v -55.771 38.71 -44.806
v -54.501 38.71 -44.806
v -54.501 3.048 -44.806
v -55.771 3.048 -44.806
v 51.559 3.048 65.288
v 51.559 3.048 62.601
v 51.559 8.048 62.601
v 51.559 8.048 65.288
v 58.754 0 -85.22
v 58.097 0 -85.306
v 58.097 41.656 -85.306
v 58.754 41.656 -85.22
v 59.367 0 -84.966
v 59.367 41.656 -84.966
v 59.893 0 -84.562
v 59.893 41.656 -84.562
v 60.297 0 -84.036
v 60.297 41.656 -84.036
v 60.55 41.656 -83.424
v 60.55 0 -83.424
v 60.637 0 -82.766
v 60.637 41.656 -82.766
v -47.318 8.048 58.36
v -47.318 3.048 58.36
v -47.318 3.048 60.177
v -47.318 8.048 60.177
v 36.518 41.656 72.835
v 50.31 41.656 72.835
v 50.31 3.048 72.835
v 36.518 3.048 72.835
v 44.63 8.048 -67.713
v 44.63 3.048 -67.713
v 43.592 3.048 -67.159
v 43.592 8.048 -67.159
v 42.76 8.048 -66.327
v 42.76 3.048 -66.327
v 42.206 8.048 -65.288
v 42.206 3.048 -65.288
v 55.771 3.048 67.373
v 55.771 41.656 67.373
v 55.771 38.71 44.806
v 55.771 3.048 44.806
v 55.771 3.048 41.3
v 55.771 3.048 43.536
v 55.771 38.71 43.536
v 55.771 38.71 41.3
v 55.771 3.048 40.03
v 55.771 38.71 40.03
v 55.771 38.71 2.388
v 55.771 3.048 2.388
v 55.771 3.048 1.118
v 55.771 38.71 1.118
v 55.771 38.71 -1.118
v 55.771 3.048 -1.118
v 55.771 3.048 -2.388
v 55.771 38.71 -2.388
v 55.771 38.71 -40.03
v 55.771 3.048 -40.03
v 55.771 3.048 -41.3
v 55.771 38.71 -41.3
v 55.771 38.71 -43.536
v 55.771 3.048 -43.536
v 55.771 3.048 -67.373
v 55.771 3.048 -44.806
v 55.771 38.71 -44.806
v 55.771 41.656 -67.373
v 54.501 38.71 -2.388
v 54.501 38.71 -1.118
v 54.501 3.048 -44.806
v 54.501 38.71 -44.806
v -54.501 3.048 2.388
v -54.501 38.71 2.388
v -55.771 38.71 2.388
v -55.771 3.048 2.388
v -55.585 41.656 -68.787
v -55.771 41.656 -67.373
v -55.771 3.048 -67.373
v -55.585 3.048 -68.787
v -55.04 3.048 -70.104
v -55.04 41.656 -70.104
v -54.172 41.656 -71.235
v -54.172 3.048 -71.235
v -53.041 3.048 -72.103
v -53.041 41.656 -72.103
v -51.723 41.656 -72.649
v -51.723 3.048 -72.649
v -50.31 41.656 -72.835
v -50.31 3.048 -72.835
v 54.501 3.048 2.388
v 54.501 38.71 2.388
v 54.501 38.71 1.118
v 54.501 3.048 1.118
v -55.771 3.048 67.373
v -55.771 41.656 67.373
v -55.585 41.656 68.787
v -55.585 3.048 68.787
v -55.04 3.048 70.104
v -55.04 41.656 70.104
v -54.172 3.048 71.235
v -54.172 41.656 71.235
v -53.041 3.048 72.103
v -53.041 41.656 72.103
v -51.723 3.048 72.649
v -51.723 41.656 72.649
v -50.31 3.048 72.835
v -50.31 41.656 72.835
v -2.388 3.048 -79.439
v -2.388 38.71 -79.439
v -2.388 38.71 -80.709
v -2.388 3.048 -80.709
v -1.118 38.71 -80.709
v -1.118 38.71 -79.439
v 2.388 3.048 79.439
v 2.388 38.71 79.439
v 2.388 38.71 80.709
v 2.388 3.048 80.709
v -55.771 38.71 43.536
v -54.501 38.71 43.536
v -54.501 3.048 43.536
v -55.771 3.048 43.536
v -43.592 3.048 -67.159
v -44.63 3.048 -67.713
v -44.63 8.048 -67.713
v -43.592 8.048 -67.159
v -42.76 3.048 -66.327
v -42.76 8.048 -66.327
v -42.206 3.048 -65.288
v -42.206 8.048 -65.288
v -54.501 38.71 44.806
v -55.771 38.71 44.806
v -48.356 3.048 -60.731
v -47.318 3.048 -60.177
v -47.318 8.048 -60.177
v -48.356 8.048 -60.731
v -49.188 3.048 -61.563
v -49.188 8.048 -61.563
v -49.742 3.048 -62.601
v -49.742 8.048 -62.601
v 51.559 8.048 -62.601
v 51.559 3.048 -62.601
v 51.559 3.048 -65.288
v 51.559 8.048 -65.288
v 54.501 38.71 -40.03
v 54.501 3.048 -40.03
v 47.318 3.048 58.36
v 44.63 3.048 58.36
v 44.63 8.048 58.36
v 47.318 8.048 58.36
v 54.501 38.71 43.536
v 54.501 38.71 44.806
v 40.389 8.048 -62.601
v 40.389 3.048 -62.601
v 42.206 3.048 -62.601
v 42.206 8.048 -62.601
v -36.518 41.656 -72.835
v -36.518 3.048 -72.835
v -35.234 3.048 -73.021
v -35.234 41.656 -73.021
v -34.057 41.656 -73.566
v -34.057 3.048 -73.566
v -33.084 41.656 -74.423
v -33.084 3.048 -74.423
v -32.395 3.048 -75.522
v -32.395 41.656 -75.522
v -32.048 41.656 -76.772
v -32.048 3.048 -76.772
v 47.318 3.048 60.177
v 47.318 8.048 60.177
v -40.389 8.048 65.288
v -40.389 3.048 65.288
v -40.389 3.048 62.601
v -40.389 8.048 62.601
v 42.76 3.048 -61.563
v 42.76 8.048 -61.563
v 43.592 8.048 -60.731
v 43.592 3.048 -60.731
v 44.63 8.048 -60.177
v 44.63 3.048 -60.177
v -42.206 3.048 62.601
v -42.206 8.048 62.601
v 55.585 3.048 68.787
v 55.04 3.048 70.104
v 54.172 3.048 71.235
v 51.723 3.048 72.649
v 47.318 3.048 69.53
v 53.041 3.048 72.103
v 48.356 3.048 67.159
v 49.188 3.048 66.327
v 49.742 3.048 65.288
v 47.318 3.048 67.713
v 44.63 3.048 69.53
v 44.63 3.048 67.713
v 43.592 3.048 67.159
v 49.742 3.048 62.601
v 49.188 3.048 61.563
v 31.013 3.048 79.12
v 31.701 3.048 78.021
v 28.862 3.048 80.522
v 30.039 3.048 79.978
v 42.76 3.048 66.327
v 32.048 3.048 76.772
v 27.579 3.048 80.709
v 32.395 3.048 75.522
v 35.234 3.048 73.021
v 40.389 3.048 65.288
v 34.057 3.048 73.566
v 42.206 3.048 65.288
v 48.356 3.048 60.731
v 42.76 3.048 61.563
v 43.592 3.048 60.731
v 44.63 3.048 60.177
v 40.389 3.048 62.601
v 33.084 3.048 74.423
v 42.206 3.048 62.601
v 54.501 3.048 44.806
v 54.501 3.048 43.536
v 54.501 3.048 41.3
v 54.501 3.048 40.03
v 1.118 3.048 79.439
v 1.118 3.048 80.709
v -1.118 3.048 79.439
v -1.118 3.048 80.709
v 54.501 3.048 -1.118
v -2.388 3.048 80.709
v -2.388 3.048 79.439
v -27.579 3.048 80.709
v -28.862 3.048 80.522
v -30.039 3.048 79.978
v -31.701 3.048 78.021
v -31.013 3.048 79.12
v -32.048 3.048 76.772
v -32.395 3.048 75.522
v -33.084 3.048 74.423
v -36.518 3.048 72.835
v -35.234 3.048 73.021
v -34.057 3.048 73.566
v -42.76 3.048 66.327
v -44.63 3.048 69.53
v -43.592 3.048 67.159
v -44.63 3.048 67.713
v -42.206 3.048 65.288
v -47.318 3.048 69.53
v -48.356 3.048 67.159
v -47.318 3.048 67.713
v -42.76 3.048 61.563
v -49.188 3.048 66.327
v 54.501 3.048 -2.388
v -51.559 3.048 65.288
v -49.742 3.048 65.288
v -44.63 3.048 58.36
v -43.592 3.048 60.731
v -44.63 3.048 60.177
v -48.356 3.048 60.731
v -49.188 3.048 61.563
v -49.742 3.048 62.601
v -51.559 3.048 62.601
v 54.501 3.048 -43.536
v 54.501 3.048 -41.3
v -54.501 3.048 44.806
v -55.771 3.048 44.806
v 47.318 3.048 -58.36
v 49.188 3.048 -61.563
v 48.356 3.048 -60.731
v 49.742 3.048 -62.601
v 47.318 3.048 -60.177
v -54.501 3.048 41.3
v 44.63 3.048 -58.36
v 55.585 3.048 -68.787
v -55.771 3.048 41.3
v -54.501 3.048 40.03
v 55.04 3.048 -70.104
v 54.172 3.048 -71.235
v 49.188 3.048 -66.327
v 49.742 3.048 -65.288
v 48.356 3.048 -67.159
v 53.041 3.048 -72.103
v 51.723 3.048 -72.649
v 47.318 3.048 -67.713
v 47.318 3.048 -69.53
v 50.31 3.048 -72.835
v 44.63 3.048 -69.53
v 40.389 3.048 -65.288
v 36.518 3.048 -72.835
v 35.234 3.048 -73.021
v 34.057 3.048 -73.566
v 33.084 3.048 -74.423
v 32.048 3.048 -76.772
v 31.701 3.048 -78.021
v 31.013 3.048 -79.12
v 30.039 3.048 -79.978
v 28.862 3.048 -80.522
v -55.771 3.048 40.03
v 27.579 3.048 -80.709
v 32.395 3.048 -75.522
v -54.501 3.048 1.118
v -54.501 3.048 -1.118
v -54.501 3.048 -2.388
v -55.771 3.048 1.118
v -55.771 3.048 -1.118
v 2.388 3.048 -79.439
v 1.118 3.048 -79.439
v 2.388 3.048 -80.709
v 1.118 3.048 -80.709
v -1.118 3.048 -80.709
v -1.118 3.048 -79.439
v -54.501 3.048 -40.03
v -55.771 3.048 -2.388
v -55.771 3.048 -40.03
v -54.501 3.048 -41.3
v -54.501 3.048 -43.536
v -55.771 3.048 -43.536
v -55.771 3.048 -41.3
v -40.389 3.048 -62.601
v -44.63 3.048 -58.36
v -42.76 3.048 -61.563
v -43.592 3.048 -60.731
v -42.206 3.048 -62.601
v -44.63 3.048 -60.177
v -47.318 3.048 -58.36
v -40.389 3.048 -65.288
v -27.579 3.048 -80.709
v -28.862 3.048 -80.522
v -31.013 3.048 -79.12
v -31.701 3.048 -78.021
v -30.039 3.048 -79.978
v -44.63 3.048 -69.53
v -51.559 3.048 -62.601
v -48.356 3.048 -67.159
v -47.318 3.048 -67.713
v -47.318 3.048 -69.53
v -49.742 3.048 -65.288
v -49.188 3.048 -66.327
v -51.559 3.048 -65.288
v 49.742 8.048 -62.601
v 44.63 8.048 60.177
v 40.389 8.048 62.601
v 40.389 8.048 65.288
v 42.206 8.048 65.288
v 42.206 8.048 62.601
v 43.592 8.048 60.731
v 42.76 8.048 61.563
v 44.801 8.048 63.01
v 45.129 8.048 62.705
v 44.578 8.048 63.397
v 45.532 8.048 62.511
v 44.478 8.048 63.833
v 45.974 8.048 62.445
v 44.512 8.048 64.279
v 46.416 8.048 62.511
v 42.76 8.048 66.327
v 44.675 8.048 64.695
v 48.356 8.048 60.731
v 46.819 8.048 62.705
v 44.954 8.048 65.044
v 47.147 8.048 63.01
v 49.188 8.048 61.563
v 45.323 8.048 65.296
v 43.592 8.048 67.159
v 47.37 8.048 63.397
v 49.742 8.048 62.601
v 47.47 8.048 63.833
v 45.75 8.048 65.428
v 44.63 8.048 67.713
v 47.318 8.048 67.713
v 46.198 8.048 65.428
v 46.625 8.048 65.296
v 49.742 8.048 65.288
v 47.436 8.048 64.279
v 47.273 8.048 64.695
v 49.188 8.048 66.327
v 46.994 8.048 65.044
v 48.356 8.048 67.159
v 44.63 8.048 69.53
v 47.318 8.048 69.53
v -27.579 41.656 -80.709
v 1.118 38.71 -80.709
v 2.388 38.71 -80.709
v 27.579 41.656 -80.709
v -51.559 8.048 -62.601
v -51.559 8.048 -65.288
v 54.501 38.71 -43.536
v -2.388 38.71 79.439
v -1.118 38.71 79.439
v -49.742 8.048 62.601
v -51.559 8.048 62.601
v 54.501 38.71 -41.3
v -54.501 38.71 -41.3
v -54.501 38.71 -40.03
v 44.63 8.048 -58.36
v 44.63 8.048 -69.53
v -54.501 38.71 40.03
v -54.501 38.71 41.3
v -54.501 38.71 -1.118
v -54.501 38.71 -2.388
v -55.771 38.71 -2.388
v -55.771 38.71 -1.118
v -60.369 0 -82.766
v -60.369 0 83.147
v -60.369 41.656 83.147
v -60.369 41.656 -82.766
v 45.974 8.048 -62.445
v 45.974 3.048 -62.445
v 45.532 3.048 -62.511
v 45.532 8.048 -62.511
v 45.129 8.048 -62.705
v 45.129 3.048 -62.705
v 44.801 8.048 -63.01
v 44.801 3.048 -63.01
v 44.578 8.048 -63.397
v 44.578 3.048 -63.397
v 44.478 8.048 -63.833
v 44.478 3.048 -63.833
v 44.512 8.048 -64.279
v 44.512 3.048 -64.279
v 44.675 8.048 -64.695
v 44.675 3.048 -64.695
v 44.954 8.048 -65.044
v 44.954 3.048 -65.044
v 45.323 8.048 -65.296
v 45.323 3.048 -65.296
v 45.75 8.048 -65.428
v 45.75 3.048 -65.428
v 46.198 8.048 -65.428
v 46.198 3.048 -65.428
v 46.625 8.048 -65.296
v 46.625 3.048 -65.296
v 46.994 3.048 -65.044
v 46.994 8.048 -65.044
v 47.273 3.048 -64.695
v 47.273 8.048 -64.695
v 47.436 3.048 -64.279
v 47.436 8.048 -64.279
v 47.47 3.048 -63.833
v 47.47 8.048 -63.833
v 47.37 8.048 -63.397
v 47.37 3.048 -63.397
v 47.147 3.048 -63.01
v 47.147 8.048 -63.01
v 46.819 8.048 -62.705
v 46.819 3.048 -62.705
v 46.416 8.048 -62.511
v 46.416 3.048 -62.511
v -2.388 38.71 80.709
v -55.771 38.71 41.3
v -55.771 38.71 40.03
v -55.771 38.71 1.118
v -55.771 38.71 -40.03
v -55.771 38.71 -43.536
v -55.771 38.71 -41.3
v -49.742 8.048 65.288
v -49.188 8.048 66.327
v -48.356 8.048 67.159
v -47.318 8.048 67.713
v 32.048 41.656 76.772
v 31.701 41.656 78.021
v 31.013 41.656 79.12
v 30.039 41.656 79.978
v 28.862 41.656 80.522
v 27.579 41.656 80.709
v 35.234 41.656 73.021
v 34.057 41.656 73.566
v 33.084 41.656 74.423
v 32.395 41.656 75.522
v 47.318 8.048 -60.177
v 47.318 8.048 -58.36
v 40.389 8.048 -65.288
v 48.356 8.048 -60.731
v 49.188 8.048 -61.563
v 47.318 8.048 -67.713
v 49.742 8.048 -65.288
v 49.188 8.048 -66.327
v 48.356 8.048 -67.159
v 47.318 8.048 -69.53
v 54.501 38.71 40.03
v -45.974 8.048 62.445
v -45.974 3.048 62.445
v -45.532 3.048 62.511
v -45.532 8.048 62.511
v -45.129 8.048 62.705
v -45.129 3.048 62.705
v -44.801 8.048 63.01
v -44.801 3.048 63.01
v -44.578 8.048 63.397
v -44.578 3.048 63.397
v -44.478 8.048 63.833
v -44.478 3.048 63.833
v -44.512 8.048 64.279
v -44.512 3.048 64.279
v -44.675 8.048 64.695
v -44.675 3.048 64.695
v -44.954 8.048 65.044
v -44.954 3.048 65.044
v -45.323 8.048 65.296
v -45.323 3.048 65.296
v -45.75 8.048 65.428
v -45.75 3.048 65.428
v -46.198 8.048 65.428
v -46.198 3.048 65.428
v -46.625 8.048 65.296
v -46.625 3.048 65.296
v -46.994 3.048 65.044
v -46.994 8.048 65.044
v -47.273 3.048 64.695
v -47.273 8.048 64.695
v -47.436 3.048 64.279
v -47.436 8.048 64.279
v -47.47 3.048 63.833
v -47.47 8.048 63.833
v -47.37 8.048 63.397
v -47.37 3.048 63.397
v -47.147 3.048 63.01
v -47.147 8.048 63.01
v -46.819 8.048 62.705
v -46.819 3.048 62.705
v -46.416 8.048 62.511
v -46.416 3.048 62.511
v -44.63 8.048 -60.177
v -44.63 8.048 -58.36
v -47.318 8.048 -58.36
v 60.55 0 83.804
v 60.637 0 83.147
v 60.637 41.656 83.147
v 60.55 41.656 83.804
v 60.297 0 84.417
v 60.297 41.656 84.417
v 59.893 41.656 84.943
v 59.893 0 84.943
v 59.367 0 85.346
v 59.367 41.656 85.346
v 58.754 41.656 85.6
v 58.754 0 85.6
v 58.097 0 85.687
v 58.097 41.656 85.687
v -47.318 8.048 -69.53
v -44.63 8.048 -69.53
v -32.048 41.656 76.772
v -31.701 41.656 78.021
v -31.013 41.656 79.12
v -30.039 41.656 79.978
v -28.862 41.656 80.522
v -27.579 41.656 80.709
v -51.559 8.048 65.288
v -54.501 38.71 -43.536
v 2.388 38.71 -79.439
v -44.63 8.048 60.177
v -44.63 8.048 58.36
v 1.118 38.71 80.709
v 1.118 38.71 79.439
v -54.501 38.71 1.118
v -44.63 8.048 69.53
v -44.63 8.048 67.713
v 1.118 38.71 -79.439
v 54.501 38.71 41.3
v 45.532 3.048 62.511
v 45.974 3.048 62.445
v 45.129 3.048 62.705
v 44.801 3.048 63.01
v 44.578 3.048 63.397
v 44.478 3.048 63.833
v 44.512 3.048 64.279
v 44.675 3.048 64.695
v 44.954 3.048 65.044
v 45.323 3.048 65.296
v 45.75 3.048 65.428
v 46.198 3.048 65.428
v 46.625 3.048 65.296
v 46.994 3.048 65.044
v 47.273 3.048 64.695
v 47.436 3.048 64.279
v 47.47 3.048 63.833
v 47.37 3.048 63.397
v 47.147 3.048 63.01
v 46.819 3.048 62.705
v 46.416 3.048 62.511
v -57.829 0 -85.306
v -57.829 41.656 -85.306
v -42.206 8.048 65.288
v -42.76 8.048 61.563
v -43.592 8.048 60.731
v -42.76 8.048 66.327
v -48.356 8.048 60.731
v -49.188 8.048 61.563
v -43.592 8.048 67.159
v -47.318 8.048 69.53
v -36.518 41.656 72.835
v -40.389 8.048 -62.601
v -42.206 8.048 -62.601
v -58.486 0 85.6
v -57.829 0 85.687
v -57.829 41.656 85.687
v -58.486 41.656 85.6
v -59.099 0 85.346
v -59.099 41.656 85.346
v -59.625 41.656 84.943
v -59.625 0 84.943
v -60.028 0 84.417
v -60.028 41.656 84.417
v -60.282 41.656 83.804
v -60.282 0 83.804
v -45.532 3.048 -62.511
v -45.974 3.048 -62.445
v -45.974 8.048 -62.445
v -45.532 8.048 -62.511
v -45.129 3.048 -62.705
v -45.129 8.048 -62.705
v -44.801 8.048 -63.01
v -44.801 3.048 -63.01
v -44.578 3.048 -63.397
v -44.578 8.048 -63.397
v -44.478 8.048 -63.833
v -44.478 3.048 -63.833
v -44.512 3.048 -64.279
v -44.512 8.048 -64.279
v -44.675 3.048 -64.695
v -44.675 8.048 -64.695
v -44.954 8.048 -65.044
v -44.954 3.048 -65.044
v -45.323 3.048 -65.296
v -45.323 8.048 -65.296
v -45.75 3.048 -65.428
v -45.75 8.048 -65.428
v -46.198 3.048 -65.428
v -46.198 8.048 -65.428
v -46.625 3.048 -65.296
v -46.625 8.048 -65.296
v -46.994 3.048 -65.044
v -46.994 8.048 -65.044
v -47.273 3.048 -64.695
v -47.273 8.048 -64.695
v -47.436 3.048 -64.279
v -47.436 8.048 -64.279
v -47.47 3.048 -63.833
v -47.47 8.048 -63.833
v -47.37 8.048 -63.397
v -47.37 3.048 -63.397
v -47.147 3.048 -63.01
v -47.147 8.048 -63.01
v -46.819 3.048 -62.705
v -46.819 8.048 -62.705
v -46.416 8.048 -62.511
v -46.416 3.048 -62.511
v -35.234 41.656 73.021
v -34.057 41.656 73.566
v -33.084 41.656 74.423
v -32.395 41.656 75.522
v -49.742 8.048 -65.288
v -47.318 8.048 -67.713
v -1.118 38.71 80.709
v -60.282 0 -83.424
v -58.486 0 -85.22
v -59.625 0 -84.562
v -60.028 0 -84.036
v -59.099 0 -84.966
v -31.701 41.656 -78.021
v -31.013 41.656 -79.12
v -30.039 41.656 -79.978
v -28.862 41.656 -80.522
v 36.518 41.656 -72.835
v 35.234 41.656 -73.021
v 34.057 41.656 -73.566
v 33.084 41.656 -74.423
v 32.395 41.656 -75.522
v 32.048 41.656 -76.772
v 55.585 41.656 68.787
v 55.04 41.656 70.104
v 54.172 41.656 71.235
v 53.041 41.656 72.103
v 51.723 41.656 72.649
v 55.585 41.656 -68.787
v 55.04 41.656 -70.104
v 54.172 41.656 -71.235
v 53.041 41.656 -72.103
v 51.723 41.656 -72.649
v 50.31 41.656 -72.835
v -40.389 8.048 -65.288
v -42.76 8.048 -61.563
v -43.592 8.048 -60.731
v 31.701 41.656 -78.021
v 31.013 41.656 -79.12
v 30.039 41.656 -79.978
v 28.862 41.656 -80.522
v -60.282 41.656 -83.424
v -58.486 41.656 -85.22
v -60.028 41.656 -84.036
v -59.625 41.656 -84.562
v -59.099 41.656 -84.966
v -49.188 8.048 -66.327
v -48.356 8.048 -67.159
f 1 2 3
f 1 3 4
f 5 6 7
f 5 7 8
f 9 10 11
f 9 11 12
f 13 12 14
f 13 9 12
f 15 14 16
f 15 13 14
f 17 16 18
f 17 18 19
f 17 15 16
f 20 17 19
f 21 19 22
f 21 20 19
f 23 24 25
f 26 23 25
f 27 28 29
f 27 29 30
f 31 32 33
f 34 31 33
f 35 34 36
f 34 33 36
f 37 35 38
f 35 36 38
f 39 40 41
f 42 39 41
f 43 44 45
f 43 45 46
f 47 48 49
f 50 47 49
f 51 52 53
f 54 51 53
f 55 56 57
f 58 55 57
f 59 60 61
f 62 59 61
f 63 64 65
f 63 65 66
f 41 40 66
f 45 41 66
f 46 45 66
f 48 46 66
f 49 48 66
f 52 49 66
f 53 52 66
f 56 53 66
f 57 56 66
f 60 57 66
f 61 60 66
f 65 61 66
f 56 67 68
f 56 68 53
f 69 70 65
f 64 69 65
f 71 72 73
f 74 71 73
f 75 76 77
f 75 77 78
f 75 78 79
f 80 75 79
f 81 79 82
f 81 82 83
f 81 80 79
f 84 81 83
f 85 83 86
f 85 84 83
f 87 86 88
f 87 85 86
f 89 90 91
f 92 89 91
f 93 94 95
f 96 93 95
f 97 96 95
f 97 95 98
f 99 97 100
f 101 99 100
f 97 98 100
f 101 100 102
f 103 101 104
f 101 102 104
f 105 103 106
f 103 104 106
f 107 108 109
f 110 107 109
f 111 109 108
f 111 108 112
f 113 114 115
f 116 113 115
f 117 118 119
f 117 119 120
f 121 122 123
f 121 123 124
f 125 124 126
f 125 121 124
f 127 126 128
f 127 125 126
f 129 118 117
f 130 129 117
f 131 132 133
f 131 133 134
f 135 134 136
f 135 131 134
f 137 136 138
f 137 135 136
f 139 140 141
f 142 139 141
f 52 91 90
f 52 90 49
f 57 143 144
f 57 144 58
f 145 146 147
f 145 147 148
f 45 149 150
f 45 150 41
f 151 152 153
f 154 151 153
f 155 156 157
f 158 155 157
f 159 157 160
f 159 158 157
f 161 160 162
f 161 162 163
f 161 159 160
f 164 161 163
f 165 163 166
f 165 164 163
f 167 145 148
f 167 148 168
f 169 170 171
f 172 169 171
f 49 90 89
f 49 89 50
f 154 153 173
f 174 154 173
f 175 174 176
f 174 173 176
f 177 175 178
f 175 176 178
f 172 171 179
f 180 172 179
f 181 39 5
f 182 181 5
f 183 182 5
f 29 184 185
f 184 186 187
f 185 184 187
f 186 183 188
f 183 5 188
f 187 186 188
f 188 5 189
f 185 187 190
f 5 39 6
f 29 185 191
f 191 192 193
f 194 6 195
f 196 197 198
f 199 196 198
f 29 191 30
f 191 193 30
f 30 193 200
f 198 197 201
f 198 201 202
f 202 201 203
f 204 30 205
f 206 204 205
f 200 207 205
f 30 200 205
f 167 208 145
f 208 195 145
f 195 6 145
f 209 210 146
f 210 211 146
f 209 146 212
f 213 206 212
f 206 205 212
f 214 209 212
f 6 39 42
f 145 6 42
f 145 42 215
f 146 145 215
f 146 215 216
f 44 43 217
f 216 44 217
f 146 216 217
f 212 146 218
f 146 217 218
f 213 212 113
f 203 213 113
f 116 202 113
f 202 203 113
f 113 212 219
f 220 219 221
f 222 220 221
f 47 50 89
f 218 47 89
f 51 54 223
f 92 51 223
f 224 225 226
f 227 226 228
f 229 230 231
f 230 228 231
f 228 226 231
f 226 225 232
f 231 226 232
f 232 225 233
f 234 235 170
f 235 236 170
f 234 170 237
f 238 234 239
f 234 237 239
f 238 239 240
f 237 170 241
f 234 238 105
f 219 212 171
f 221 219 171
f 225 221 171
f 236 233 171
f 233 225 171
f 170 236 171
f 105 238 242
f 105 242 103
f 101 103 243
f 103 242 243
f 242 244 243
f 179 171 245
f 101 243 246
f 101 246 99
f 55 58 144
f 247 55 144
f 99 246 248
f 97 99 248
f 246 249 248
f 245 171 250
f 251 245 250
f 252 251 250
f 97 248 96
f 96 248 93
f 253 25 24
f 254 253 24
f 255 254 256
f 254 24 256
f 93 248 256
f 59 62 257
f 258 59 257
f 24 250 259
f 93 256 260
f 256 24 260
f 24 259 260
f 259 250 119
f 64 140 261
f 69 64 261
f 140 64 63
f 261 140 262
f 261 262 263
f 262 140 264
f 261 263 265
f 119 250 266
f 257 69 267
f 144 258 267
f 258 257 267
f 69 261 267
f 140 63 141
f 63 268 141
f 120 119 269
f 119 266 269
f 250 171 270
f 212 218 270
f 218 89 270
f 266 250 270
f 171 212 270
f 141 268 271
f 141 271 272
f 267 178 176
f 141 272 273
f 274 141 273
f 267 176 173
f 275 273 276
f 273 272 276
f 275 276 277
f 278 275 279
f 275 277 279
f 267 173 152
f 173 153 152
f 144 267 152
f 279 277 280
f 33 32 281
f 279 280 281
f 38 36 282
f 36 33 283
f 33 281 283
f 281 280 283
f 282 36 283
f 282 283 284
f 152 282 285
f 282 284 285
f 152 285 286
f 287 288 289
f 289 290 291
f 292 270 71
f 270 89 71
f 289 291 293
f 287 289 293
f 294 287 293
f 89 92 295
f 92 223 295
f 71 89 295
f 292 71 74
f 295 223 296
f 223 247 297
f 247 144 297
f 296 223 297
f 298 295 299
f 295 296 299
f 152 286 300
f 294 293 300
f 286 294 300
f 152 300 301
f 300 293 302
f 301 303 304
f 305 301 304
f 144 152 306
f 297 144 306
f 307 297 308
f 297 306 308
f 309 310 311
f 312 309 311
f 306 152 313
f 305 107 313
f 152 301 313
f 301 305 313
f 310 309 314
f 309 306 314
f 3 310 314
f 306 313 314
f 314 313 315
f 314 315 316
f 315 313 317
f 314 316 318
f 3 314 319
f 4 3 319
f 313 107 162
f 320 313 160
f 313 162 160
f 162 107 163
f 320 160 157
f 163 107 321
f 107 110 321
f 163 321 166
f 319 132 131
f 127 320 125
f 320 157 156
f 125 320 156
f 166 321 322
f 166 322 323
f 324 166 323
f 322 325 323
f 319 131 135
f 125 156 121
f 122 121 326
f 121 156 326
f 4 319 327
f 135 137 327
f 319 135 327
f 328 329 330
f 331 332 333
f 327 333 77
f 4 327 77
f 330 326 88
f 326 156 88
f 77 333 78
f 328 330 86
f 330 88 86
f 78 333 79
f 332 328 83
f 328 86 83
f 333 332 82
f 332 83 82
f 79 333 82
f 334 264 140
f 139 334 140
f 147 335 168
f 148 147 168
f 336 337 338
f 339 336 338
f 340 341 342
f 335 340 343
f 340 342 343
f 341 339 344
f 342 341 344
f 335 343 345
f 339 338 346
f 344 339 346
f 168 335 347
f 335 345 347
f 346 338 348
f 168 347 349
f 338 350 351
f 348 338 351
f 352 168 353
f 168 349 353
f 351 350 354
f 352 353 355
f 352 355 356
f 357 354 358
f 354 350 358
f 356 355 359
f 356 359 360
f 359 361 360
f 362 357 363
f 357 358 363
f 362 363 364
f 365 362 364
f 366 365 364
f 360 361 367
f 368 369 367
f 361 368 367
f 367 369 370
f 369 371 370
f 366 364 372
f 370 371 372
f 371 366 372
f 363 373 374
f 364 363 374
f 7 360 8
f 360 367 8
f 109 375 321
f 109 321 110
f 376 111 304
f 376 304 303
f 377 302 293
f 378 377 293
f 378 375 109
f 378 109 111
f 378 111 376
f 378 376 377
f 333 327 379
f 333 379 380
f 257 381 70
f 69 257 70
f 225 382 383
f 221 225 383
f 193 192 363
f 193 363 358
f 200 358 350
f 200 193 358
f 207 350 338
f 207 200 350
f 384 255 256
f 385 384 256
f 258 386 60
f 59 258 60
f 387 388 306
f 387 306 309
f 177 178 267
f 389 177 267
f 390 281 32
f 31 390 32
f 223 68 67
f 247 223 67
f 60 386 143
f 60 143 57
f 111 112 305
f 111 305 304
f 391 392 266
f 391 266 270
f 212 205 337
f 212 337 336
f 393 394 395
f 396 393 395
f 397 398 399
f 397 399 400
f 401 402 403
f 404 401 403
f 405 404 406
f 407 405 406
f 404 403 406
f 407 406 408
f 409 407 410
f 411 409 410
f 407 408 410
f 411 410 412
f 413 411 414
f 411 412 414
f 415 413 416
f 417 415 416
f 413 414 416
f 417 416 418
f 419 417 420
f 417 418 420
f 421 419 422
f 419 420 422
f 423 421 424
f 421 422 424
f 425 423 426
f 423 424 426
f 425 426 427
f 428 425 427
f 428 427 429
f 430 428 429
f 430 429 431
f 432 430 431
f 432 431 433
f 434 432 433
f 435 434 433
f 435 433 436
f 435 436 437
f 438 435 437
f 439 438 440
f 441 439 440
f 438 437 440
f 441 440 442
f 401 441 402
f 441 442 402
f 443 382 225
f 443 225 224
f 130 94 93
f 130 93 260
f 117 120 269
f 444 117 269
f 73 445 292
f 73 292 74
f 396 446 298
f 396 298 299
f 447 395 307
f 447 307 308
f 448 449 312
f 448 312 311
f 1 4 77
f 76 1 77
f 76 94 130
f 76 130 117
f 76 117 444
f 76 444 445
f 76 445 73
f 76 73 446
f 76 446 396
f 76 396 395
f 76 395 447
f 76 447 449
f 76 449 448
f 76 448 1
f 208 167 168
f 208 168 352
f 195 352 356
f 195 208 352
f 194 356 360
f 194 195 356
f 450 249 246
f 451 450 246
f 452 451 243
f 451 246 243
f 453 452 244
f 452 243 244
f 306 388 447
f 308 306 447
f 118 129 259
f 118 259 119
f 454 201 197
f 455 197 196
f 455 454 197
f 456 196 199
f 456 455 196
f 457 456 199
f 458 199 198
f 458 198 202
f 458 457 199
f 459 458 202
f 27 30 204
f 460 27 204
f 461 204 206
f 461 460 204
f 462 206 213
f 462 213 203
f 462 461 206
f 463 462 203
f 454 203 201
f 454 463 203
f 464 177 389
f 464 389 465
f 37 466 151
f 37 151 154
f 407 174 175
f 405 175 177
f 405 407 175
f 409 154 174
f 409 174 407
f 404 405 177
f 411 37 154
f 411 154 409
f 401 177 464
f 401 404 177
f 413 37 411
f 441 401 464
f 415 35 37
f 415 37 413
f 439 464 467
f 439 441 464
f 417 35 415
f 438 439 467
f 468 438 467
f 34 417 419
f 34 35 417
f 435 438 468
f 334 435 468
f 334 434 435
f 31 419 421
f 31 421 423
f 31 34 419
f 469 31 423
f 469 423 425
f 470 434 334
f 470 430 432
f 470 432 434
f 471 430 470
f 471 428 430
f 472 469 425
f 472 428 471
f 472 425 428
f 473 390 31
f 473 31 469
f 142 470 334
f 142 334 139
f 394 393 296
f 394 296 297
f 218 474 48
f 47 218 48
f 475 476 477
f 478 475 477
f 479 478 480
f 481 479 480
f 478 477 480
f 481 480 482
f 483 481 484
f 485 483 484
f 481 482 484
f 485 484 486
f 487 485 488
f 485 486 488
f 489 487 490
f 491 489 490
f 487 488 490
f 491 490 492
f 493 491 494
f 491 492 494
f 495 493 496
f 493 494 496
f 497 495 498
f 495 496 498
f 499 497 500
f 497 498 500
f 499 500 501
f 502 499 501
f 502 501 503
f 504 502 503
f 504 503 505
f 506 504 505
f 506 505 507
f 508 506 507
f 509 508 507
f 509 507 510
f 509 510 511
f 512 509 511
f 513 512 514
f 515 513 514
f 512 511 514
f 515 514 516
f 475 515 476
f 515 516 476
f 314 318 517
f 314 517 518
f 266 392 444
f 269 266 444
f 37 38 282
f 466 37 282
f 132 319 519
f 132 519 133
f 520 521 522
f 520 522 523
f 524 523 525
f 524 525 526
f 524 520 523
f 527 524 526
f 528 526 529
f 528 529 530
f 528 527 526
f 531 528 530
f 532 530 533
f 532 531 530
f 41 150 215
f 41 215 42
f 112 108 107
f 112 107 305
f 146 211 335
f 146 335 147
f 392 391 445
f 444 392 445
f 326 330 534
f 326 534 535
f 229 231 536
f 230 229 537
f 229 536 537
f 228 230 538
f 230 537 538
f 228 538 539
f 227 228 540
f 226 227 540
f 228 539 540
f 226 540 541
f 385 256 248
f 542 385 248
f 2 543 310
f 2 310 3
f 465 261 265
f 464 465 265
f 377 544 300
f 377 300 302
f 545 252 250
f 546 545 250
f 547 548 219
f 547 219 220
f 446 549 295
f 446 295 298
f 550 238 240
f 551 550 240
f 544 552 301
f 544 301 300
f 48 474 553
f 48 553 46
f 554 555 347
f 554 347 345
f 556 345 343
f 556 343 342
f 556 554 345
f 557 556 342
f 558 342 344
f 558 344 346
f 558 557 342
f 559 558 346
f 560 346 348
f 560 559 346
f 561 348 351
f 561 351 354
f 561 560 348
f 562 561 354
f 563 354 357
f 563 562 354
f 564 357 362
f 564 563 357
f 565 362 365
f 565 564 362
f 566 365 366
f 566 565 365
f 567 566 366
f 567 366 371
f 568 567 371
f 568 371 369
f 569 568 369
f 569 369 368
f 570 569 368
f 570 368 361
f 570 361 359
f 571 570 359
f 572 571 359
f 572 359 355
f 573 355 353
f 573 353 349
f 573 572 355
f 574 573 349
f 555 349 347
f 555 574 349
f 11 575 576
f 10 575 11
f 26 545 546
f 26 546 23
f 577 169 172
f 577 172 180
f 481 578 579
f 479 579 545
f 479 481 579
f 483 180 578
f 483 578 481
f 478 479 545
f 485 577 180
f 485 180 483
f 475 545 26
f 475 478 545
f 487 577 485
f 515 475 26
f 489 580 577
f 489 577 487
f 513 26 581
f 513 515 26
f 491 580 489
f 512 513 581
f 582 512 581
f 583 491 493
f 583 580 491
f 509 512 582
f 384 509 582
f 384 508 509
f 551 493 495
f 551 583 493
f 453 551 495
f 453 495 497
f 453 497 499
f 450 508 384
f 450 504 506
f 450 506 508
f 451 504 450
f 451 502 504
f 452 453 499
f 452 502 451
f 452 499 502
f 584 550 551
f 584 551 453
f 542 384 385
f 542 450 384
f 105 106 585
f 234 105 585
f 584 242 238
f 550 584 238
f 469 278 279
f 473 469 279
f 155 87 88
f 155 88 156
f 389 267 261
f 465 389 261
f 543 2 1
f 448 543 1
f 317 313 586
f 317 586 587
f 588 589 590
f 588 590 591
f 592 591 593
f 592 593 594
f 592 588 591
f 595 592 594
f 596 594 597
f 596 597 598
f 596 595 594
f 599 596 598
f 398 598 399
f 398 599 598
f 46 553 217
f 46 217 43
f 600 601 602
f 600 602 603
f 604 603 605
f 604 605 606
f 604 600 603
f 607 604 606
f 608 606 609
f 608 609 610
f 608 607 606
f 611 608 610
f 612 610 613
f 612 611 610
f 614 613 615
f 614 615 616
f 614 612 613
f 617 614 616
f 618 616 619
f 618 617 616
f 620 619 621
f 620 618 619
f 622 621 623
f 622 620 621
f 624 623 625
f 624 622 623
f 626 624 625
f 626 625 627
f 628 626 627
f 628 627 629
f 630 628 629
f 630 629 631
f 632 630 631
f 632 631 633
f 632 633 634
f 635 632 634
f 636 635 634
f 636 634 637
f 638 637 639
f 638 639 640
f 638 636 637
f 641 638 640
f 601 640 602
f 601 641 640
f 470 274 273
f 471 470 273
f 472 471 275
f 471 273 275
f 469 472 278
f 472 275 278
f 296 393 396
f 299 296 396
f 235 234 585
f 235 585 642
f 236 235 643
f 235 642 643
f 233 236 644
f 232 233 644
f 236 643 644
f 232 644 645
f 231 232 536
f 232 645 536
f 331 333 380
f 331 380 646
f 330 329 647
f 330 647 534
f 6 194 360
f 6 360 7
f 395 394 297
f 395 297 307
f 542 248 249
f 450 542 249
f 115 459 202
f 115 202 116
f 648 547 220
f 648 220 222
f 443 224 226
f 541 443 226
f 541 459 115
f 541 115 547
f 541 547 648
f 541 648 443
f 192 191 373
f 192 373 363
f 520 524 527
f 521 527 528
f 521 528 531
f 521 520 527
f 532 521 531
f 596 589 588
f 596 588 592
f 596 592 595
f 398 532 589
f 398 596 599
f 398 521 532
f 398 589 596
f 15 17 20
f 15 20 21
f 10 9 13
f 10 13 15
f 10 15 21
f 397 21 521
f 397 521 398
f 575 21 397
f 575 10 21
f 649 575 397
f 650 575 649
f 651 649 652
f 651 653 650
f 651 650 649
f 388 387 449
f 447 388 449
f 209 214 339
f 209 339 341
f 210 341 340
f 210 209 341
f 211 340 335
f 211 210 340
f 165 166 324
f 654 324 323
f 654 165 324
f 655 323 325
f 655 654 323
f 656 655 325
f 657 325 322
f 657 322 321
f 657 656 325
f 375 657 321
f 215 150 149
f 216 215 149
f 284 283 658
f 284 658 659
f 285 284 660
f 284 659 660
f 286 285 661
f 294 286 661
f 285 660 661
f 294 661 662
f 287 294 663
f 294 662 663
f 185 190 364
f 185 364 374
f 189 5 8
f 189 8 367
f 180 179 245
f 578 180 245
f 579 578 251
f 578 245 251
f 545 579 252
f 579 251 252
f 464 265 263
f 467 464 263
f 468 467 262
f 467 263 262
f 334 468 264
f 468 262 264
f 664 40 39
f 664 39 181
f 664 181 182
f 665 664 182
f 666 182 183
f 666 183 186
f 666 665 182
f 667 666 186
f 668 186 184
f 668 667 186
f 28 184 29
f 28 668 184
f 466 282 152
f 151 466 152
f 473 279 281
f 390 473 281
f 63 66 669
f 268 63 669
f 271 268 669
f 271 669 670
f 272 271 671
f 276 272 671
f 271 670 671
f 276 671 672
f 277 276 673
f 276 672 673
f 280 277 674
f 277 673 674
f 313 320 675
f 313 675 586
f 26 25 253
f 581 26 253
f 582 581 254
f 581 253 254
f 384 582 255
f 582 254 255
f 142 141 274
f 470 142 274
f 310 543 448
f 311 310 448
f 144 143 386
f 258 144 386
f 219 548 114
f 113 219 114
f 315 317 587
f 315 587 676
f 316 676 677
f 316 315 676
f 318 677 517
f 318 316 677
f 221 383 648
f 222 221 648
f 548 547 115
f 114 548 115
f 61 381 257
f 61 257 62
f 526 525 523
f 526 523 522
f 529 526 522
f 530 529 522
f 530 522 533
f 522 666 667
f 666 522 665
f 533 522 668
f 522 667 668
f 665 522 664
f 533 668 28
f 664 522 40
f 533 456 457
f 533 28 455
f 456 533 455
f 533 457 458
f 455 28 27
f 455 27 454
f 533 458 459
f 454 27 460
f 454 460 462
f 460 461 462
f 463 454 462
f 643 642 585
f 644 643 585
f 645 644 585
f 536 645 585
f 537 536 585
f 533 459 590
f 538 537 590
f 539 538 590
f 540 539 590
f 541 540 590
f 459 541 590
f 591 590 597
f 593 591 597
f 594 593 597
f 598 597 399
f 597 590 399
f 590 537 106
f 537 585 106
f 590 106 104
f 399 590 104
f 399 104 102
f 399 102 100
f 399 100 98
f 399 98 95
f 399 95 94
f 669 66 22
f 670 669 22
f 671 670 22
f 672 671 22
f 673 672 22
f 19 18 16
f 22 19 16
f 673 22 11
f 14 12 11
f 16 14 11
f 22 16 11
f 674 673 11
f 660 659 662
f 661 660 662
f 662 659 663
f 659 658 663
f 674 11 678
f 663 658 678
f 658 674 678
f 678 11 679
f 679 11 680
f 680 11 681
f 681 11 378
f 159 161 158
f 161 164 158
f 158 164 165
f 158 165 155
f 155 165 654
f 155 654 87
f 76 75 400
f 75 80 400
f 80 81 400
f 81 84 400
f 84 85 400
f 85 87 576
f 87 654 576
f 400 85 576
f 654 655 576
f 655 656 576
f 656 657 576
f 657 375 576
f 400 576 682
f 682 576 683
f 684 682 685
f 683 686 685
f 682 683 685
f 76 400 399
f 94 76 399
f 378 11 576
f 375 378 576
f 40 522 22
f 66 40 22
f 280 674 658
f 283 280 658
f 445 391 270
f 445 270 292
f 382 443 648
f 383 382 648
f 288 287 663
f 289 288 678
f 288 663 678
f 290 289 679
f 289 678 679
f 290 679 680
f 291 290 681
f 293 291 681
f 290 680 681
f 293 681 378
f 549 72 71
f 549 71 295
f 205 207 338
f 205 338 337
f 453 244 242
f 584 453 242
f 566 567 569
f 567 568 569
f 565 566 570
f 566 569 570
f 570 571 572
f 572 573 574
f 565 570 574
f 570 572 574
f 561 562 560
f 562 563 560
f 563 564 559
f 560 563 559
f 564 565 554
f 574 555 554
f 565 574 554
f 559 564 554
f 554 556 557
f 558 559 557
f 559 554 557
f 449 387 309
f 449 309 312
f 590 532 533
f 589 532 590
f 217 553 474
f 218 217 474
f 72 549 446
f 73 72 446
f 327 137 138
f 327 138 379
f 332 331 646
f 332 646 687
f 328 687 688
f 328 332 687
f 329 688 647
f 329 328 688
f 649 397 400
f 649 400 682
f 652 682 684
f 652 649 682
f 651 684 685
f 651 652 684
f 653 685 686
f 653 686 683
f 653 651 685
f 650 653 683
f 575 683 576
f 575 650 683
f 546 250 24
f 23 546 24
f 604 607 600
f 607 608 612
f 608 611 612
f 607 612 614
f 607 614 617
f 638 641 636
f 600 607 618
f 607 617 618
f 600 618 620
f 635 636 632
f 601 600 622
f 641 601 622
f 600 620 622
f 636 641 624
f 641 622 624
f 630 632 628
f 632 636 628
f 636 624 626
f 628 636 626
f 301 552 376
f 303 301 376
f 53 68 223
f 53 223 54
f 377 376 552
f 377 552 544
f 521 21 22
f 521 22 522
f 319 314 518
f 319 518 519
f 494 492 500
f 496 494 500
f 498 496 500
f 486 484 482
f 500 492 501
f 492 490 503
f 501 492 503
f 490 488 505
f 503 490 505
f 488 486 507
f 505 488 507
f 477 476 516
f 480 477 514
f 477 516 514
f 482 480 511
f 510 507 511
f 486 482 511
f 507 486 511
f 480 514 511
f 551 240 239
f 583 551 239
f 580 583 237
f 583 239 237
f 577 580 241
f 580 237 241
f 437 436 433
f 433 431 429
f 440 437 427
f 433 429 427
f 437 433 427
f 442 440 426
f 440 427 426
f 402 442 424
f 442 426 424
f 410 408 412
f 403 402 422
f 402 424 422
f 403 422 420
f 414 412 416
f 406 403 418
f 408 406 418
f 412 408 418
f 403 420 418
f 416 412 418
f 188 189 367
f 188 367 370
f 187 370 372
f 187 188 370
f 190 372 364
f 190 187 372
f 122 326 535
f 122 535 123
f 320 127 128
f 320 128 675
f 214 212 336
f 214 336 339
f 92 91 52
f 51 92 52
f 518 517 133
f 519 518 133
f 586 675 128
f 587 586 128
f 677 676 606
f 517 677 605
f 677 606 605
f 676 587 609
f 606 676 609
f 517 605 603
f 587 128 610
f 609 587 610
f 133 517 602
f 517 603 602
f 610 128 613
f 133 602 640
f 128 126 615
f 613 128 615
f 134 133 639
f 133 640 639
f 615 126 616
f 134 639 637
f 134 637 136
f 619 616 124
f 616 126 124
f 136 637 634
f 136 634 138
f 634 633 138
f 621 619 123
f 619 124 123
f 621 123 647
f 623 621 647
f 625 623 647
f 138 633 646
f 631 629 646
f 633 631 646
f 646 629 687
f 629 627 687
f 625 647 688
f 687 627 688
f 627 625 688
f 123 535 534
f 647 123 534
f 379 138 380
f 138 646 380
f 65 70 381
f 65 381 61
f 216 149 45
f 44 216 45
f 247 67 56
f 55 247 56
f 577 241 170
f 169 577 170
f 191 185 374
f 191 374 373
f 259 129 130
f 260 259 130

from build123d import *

# Parameters (mm, degrees)
BOSS_EXTRUDE1_DEPTH     = 41.656
CUT_EXTRUDE1_DEPTH      = 38.608
SKETCH7_R               = 1.5
BOSS_EXTRUDE2_DEPTH     = 5
MIRROR2_COPY_1_DEPTH    = 38.608
MIRROR2_COPY_2_SKETCH_R = 1.5
MIRROR2_COPY_2_DEPTH    = 5
BOSS_EXTRUDE3_START     = -2.9464
SKETCH9_W               = 1.27
SKETCH9_H               = 1.27
BOSS_EXTRUDE3_DEPTH     = 35.6616
BOSS_EXTRUDE4_START     = -2.9464
SKETCH10_W              = 1.27
SKETCH10_H              = 1.27
BOSS_EXTRUDE4_DEPTH     = 35.6616


with BuildPart() as part:
    # Sketch3 → Boss-Extrude1 (new body)
    with BuildSketch(Plane(origin=(0, 0, 0), x_dir=(1, 0, 0), z_dir=(0, 1, 0))):
        with BuildLine():
            Line((58.096932885, -85.686632753), (-57.828667115, -85.686632753))
            ThreePointArc((-57.828667115, -85.686632753), (-59.624718339, -84.942683977), (-60.368667115, -83.146632753))
            Line((-60.368667115, -83.146632753), (-60.368667115, 82.766167247))
            ThreePointArc((-60.368667115, 82.766167247), (-59.624718339, 84.562218471), (-57.828667115, 85.306167247))
            Line((-57.828667115, 85.306167247), (58.096932885, 85.306167247))
            ThreePointArc((58.096932885, 85.306167247), (59.892984109, 84.562218471), (60.636932885, 82.766167247))
            Line((60.636932885, 82.766167247), (60.636932885, -83.146632753))
            ThreePointArc((60.636932885, -83.146632753), (59.892984109, -84.942683977), (58.096932885, -85.686632753))
        make_face()
    extrude(amount=BOSS_EXTRUDE1_DEPTH)

    # Sketch6 → Cut-Extrude1 (cut)
    with BuildSketch(Plane(origin=(0, 41.656, 0), x_dir=(1, 0, 0), z_dir=(0, 1, 0))):
        with BuildLine():
            Line((-55.771267115, -0.190232753), (-55.771267115, 67.373392964))
            ThreePointArc((-55.771267115, 67.373392964), (-54.171667622, 71.235167754), (-50.309892833, 72.834767247))
            Line((-50.309892833, 72.834767247), (-36.517896511, 72.834767247))
            ThreePointArc((-36.517896511, 72.834767247), (-33.539782988, 73.959370118), (-32.04836951, 76.771767247))
            ThreePointArc((-32.04836951, 76.771767247), (-30.556956031, 79.584164375), (-27.578842508, 80.708767247))
            Line((-27.578842508, 80.708767247), (0.134132885, 80.708767247))
            Line((0.134132885, 80.708767247), (0.134132885, -0.190232753))
            Line((0.134132885, -0.190232753), (-55.771267115, -0.190232753))
        make_face()
    cut_extrude1 = extrude(amount=-CUT_EXTRUDE1_DEPTH, mode=Mode.SUBTRACT)

    # Sketch7 → Boss-Extrude2 (add)
    with BuildSketch(Plane(origin=(0, 3.048, 0), x_dir=(1, 0, 0), z_dir=(0, 1, 0))):
        with BuildLine():
            Line((-47.317674081, 67.712862285), (-47.317674081, 69.529651141))
            Line((-47.317674081, 69.529651141), (-44.630325919, 69.529651141))
            Line((-44.630325919, 69.529651141), (-44.630325919, 67.712862285))
            ThreePointArc((-44.630325919, 67.712862285), (-43.145219322, 66.773547925), (-42.205904962, 65.288441328))
            Line((-42.205904962, 65.288441328), (-40.389116105, 65.288441328))
            Line((-40.389116105, 65.288441328), (-40.389116105, 62.601093165))
            Line((-40.389116105, 62.601093165), (-42.205904962, 62.601093165))
            ThreePointArc((-42.205904962, 62.601093165), (-43.145219322, 61.115986569), (-44.630325919, 60.176672209))
            Line((-44.630325919, 60.176672209), (-44.630325919, 58.359883352))
            Line((-44.630325919, 58.359883352), (-47.317674081, 58.359883352))
            Line((-47.317674081, 58.359883352), (-47.317674081, 60.176672209))
            ThreePointArc((-47.317674081, 60.176672209), (-48.802780678, 61.115986569), (-49.742095038, 62.601093165))
            Line((-49.742095038, 62.601093165), (-51.558883895, 62.601093165))
            Line((-51.558883895, 62.601093165), (-51.558883895, 65.288441328))
            Line((-51.558883895, 65.288441328), (-49.742095038, 65.288441328))
            ThreePointArc((-49.742095038, 65.288441328), (-48.802780678, 66.773547925), (-47.317674081, 67.712862285))
        make_face()
        with Locations(Location((-45.974, 63.944767247, 0), (0, 0, 270))):
            Circle(SKETCH7_R, mode=Mode.SUBTRACT)
    boss_extrude2 = extrude(amount=BOSS_EXTRUDE2_DEPTH)

    # Mirror1: Cut-Extrude1, Boss-Extrude2 across plane
    add(cut_extrude1.mirror(Plane(origin=(0, 0, 0), x_dir=(0, 0, 1), z_dir=(1, 0, 0))), mode=Mode.SUBTRACT)
    add(boss_extrude2.mirror(Plane(origin=(0, 0, 0), x_dir=(0, 0, 1), z_dir=(1, 0, 0))))

    # Mirror2: Cut-Extrude1, Boss-Extrude2 across plane
    add(cut_extrude1.mirror(Plane.XY), mode=Mode.SUBTRACT)
    add(boss_extrude2.mirror(Plane.XY))

    # Mirror2 copy 1 sketch → Mirror2 copy 1 (cut)
    with BuildSketch(Plane(origin=(0, 41.656, 0), x_dir=(-1, 0, 0), z_dir=(0, 1, 0))):
        with BuildLine():
            Line((-55.771267115, -0.190232753), (-55.771267115, 67.373392964))
            ThreePointArc((-55.771267115, 67.373392964), (-54.171667622, 71.235167754), (-50.309892833, 72.834767247))
            Line((-50.309892833, 72.834767247), (-36.517896511, 72.834767247))
            ThreePointArc((-36.517896511, 72.834767247), (-33.539782988, 73.959370118), (-32.04836951, 76.771767247))
            ThreePointArc((-32.04836951, 76.771767247), (-30.556956031, 79.584164375), (-27.578842508, 80.708767247))
            Line((-27.578842508, 80.708767247), (0.134132885, 80.708767247))
            Line((0.134132885, 80.708767247), (0.134132885, -0.190232753))
            Line((0.134132885, -0.190232753), (-55.771267115, -0.190232753))
        make_face()
    extrude(amount=-MIRROR2_COPY_1_DEPTH, mode=Mode.SUBTRACT)

    # Mirror2 copy 2 sketch → Mirror2 copy 2 (add)
    with BuildSketch(Plane(origin=(0, 3.048, 0), x_dir=(-1, 0, 0), z_dir=(0, 1, 0))):
        with BuildLine():
            Line((-47.317674081, 67.712862285), (-47.317674081, 69.529651141))
            Line((-47.317674081, 69.529651141), (-44.630325919, 69.529651141))
            Line((-44.630325919, 69.529651141), (-44.630325919, 67.712862285))
            ThreePointArc((-44.630325919, 67.712862285), (-43.145219322, 66.773547925), (-42.205904962, 65.288441328))
            Line((-42.205904962, 65.288441328), (-40.389116105, 65.288441328))
            Line((-40.389116105, 65.288441328), (-40.389116105, 62.601093165))
            Line((-40.389116105, 62.601093165), (-42.205904962, 62.601093165))
            ThreePointArc((-42.205904962, 62.601093165), (-43.145219322, 61.115986569), (-44.630325919, 60.176672209))
            Line((-44.630325919, 60.176672209), (-44.630325919, 58.359883352))
            Line((-44.630325919, 58.359883352), (-47.317674081, 58.359883352))
            Line((-47.317674081, 58.359883352), (-47.317674081, 60.176672209))
            ThreePointArc((-47.317674081, 60.176672209), (-48.802780678, 61.115986569), (-49.742095038, 62.601093165))
            Line((-49.742095038, 62.601093165), (-51.558883895, 62.601093165))
            Line((-51.558883895, 62.601093165), (-51.558883895, 65.288441328))
            Line((-51.558883895, 65.288441328), (-49.742095038, 65.288441328))
            ThreePointArc((-49.742095038, 65.288441328), (-48.802780678, 66.773547925), (-47.317674081, 67.712862285))
        make_face()
        with Locations(Location((-45.974, 63.944767247, 0), (0, 0, 270))):
            Circle(MIRROR2_COPY_2_SKETCH_R, mode=Mode.SUBTRACT)
    extrude(amount=MIRROR2_COPY_2_DEPTH)

    # Sketch9 → Boss-Extrude3 (add)
    with BuildSketch(Plane(origin=(0, 41.656, 0), x_dir=(1, 0, 0), z_dir=(0, 1, 0)).offset(BOSS_EXTRUDE3_START)):
        with Locations((-1.7526, 80.073767247)):
            Rectangle(SKETCH9_W, SKETCH9_H)
        with Locations((1.7526, 80.073767247)):
            Rectangle(SKETCH9_W, SKETCH9_H)
    boss_extrude3 = extrude(amount=-BOSS_EXTRUDE3_DEPTH)

    # Mirror3: Boss-Extrude3 across plane
    add(boss_extrude3.mirror(Plane.XY))

    # Sketch10 → Boss-Extrude4 (add)
    with BuildSketch(Plane(origin=(0, 41.656, 0), x_dir=(1, 0, 0), z_dir=(0, 1, 0)).offset(BOSS_EXTRUDE4_START)):
        with Locations((55.136267115, -1.7526)):
            Rectangle(SKETCH10_W, SKETCH10_H)
        with Locations((55.136267115, 1.7526)):
            Rectangle(SKETCH10_W, SKETCH10_H)
        with Locations((55.136267115, 40.6654)):
            Rectangle(SKETCH10_W, SKETCH10_H)
        with Locations((55.136267115, 44.1706)):
            Rectangle(SKETCH10_W, SKETCH10_H)
        with Locations((55.136267115, -44.1706)):
            Rectangle(SKETCH10_W, SKETCH10_H)
        with Locations((55.136267115, -40.6654)):
            Rectangle(SKETCH10_W, SKETCH10_H)
    boss_extrude4 = extrude(amount=-BOSS_EXTRUDE4_DEPTH)

    # Mirror4: Boss-Extrude4 across plane
    add(boss_extrude4.mirror(Plane(origin=(0, 0, 0), x_dir=(0, 0, 1), z_dir=(1, 0, 0))))


solid = part.part
